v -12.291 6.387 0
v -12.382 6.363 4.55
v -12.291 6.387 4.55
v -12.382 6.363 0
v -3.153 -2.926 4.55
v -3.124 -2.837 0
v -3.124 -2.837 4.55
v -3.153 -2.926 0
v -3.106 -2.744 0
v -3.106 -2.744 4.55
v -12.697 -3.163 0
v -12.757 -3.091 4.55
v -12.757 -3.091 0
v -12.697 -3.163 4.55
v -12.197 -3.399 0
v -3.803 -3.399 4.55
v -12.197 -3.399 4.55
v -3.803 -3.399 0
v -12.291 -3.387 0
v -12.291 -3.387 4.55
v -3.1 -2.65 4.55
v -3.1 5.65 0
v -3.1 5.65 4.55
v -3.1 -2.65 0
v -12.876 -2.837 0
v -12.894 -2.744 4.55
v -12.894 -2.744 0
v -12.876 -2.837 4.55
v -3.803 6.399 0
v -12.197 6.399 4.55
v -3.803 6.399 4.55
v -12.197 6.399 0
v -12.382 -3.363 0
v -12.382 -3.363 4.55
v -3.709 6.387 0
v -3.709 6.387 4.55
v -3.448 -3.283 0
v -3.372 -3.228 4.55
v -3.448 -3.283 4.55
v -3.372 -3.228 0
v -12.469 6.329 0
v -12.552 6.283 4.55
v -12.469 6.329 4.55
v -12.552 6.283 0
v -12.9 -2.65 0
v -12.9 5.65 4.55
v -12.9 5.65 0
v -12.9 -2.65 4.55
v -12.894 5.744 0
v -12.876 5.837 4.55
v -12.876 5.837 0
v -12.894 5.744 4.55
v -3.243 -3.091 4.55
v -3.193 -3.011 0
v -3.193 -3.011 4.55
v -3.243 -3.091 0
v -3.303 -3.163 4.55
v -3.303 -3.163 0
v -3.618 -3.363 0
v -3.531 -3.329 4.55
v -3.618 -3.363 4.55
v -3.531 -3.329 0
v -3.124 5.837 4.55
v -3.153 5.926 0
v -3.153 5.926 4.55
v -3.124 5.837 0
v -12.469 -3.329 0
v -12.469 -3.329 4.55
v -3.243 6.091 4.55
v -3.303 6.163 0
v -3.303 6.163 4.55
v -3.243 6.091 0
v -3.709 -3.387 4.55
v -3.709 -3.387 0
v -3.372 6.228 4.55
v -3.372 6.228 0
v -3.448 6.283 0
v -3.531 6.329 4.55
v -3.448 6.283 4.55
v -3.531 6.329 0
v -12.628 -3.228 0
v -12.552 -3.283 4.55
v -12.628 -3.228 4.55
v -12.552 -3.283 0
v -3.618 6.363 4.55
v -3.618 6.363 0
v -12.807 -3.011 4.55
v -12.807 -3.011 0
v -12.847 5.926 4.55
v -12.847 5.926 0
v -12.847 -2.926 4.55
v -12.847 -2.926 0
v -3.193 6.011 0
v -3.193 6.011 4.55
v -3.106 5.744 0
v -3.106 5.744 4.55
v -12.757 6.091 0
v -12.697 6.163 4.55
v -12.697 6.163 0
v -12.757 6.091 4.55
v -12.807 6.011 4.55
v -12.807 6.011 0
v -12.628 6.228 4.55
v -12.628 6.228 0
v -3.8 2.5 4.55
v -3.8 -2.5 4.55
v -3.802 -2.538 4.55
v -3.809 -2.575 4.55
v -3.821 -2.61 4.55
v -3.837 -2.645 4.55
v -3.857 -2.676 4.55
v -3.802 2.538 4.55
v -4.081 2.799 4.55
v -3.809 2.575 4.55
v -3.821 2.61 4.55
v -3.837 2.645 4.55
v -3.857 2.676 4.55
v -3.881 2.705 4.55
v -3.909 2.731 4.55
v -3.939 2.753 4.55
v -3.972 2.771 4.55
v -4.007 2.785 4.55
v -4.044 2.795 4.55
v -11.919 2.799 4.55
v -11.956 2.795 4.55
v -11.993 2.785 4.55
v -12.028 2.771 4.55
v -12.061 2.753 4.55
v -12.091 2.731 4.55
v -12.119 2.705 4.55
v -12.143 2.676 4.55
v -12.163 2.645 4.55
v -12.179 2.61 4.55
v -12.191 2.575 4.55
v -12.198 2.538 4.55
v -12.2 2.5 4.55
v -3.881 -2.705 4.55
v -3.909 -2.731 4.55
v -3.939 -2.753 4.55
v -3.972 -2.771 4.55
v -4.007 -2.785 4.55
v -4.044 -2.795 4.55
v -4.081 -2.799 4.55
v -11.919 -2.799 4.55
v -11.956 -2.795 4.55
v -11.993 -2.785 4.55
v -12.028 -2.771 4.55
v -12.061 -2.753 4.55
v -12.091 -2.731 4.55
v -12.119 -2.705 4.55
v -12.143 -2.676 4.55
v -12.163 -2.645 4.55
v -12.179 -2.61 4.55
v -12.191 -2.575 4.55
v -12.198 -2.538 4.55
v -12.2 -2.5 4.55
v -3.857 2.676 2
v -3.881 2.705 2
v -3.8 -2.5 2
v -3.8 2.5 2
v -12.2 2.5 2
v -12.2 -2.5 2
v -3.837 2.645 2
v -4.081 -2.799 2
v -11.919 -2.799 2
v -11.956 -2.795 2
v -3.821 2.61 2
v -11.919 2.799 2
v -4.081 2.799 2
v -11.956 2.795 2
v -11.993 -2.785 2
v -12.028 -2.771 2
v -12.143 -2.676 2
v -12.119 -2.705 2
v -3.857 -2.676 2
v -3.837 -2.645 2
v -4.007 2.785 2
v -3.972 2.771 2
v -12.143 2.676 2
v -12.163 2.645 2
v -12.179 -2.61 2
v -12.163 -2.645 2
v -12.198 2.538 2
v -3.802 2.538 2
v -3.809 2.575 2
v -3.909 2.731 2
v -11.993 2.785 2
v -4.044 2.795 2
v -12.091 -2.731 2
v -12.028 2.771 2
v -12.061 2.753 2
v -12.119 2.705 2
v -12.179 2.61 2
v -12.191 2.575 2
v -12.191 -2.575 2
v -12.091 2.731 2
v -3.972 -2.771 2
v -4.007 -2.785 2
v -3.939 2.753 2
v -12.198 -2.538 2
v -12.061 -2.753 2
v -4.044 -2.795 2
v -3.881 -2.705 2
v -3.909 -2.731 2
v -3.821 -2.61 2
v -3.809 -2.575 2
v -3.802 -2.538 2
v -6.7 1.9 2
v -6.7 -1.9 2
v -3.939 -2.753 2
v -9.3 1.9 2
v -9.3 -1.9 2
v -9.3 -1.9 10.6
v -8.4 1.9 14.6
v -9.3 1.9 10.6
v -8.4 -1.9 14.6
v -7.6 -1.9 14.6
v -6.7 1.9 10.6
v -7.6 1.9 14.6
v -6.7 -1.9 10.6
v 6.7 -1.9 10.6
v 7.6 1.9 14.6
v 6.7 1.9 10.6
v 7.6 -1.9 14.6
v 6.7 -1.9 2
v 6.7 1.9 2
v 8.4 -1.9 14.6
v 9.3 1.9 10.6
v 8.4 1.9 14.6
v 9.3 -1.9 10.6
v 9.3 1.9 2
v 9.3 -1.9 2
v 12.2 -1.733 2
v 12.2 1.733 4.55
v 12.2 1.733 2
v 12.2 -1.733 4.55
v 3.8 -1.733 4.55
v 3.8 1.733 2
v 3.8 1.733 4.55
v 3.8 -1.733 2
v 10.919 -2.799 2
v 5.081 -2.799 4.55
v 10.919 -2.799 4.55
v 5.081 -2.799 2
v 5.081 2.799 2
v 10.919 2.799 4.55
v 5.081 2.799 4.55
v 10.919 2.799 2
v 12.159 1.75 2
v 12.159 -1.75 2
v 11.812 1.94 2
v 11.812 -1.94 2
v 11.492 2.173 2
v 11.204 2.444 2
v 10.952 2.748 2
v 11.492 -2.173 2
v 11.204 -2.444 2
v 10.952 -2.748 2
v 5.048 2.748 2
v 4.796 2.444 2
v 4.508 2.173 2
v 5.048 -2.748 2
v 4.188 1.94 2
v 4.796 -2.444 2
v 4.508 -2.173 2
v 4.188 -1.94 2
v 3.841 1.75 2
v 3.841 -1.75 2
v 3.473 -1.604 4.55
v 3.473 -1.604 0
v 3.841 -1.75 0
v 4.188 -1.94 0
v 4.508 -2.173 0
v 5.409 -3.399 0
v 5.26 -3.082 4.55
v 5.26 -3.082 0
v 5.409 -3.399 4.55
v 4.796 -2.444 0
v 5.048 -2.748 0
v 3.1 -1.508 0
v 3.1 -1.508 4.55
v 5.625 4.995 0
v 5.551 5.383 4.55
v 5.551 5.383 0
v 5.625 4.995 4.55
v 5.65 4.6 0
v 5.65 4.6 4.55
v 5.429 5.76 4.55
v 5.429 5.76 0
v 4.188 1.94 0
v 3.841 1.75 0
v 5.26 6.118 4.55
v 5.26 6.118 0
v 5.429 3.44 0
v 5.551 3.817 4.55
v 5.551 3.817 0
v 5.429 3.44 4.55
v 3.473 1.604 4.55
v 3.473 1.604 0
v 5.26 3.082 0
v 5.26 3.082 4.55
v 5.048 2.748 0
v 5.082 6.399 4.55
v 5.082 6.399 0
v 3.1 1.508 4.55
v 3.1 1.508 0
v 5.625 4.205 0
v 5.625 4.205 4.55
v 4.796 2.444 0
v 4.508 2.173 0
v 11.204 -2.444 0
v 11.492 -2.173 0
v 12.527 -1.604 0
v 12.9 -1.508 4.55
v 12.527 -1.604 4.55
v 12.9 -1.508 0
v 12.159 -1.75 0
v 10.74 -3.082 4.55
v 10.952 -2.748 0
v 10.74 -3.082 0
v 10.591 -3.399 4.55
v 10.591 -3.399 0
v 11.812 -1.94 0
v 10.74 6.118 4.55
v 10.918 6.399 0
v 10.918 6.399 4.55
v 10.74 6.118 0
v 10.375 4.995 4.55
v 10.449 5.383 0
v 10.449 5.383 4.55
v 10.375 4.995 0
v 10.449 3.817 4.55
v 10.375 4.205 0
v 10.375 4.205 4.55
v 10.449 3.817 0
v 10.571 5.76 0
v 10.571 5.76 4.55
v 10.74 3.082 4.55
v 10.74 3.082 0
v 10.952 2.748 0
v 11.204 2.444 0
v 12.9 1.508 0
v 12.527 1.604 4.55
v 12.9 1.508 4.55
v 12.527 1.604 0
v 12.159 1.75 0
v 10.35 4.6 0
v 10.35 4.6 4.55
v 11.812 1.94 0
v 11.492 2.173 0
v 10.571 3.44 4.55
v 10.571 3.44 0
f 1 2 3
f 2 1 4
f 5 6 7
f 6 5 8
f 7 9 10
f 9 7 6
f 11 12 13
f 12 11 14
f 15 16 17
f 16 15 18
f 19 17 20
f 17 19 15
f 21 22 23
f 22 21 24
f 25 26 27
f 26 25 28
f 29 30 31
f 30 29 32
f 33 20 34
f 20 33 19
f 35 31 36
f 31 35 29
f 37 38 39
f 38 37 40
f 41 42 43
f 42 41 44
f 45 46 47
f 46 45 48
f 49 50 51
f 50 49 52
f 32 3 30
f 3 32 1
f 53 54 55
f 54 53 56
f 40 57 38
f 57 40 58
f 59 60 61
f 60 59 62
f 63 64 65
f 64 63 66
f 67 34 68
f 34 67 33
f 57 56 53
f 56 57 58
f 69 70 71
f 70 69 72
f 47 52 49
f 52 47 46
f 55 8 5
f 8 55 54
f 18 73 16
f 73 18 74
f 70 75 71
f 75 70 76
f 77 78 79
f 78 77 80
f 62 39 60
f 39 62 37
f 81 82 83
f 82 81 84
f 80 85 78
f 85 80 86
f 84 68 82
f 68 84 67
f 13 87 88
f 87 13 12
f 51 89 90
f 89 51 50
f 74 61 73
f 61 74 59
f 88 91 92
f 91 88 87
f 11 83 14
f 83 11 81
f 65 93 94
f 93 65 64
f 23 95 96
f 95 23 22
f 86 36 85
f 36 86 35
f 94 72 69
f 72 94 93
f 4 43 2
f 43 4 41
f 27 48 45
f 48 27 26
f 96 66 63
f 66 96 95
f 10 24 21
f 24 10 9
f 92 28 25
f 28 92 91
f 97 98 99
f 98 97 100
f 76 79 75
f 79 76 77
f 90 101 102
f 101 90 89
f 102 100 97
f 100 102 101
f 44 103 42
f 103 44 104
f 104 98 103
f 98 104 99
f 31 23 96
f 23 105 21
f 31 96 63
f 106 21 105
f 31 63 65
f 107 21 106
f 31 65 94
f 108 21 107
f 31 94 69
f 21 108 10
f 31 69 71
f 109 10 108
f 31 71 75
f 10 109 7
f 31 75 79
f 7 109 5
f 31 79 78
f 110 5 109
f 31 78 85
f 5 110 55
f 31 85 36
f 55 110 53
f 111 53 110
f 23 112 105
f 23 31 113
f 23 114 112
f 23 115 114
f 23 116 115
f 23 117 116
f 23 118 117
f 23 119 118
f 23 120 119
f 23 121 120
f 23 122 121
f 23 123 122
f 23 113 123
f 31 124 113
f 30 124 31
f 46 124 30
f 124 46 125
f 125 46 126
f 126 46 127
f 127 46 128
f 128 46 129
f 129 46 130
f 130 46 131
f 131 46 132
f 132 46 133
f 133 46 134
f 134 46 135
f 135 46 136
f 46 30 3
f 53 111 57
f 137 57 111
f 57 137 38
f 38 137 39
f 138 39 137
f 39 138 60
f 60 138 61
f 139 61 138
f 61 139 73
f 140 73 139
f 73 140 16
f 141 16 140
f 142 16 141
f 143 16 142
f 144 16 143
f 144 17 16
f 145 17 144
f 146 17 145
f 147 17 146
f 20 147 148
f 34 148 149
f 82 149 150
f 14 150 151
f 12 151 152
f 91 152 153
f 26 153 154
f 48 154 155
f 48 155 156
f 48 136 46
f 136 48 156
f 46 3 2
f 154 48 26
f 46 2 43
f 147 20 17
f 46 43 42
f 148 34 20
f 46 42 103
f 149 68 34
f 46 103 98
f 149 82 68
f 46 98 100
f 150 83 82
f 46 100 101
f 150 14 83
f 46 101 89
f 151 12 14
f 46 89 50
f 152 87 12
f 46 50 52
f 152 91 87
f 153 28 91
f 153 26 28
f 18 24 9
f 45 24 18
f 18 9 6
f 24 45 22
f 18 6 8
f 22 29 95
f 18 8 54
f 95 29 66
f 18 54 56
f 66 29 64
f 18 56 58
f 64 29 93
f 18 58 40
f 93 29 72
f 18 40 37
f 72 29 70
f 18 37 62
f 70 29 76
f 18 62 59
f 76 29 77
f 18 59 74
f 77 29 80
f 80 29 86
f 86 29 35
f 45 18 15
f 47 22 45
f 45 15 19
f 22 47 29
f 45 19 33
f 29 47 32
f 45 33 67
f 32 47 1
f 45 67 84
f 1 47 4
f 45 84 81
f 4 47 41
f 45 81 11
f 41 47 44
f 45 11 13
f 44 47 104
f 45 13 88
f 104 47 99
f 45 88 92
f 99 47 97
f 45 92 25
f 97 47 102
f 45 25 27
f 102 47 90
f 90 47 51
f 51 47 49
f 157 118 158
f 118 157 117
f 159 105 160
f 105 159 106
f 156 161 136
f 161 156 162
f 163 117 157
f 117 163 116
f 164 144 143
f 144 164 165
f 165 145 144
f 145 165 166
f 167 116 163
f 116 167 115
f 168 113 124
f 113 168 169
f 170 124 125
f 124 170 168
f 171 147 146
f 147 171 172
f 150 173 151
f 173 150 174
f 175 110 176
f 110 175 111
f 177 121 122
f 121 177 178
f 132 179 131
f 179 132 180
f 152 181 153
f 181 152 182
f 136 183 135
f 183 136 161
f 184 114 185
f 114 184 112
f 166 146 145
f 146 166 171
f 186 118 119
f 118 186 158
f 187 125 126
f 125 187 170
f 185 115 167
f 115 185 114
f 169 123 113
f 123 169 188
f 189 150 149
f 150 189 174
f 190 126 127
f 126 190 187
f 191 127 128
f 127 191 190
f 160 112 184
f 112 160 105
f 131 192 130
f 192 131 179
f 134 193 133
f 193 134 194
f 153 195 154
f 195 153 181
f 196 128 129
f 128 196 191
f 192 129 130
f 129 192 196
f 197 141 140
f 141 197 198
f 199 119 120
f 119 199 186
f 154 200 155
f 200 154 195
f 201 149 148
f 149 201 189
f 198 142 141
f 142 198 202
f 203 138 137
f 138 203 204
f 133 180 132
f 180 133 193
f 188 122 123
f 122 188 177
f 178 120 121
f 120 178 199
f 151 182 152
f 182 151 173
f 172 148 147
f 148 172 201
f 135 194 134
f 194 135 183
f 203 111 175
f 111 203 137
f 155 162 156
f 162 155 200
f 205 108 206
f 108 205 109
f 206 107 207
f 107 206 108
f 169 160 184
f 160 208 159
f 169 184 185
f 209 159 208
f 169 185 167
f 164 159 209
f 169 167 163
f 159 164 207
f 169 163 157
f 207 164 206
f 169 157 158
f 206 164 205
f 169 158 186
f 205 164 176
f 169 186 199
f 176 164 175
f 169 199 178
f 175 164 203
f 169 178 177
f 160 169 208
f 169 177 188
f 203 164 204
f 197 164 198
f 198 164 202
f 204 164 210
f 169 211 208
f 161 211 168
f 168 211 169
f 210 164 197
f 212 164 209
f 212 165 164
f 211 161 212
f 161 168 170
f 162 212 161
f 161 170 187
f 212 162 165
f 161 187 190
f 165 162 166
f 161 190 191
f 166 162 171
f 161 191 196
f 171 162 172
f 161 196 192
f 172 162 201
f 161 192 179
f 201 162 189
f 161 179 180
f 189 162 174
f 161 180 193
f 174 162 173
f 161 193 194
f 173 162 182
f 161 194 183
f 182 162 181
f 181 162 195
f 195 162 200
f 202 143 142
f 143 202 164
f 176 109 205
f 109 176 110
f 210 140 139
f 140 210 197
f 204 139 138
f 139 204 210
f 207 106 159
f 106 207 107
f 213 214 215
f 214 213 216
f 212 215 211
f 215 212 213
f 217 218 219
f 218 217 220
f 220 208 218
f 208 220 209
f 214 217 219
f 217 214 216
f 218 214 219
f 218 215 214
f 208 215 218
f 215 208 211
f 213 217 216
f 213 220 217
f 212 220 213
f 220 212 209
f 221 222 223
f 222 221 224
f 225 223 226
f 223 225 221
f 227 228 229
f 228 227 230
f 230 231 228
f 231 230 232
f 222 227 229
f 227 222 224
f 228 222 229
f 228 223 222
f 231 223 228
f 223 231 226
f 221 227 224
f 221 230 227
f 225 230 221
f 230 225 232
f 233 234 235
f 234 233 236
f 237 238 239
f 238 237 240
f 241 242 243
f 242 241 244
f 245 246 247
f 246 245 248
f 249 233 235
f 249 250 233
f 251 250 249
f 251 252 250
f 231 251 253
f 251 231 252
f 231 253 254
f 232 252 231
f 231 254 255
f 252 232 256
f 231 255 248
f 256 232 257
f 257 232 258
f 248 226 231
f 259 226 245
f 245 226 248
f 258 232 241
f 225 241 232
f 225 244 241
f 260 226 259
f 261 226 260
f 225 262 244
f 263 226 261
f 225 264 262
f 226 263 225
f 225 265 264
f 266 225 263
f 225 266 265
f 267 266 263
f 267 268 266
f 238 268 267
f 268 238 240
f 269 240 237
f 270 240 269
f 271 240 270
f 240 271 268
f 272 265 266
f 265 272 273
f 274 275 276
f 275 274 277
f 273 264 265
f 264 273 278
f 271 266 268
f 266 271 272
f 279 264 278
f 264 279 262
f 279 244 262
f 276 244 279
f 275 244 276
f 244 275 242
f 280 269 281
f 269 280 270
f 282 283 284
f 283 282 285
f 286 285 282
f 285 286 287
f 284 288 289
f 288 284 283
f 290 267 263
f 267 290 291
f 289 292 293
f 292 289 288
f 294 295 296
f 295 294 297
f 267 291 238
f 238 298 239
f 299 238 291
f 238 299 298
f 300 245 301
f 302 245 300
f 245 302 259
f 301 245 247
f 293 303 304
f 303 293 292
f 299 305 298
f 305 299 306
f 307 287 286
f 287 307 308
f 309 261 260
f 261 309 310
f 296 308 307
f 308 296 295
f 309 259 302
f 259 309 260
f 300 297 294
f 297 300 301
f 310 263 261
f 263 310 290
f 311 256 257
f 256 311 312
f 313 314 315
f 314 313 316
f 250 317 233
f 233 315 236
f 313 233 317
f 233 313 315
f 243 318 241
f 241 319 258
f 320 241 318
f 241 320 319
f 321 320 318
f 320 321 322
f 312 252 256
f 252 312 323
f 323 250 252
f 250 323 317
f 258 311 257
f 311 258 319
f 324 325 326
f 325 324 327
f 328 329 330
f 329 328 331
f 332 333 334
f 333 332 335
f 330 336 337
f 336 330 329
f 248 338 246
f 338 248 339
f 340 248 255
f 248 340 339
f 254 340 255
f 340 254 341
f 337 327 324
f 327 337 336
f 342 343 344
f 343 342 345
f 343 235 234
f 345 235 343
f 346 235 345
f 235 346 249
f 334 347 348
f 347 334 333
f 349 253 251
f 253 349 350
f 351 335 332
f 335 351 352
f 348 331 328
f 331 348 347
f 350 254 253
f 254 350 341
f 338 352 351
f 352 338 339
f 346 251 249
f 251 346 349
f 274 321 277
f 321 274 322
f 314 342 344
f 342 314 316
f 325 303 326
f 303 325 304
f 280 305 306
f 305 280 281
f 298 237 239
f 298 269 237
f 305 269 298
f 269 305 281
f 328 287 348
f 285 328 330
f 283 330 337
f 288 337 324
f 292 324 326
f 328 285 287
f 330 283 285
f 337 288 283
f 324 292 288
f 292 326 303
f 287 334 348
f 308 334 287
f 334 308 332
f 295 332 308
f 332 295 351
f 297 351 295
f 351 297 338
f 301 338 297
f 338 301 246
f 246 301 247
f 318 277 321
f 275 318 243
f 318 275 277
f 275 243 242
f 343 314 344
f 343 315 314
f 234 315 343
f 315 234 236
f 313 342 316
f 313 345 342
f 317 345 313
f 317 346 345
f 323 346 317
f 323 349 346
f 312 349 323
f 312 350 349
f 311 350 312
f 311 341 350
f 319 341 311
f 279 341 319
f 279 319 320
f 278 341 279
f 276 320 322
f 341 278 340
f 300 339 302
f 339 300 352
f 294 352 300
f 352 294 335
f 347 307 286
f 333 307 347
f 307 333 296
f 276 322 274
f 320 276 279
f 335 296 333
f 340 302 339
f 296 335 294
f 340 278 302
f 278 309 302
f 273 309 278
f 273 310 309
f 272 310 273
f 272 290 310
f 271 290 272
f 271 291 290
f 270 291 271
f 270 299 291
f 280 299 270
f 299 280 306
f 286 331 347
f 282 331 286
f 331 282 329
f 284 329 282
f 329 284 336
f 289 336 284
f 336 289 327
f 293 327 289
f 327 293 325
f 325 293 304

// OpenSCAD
translate([-8,0,0]) { 
// Archived geometry from ../../../parts/oobb_organization_storage_drawer_unit_rectangle_100_ml_tamper_evident_systempak_209_container_1_column_2_row_ai_version_7_style_unit_1_wide_2_tall/front_plug_square.scad
$fn = 50;

difference() {
	union() {
		translate(v = [0, 0, 0]) {
			rotate(a = [0, 0, 0]) {
				difference() {
					union() {
						translate(v = [0, 0, 0]) {
							rotate(a = [0, 0, 0]) {
								difference() {
									union() {
										translate(v = [0, 0, 0]) {
											rotate(a = [0, 0, 0]) {
												difference() {
													union() {
														translate(v = [0, 1.5, 0]) {
															hull() {
																translate(v = [-4.15, 4.15, 0]) {
																	cylinder(h = 4.55, r = 0.75);
																}
																translate(v = [4.15, 4.15, 0]) {
																	cylinder(h = 4.55, r = 0.75);
																}
																translate(v = [-4.15, -4.15, 0]) {
																	cylinder(h = 4.55, r = 0.75);
																}
																translate(v = [4.15, -4.15, 0]) {
																	cylinder(h = 4.55, r = 0.75);
																}
															}
														}
													}
													union() {
														translate(v = [0, 0, 2.0]) {
															hull() {
																translate(v = [-3.9000000000000004, 2.5, 0]) {
																	cylinder(h = 2.65, r = 0.3);
																}
																translate(v = [3.9000000000000004, 2.5, 0]) {
																	cylinder(h = 2.65, r = 0.3);
																}
																translate(v = [-3.9000000000000004, -2.5, 0]) {
																	cylinder(h = 2.65, r = 0.3);
																}
																translate(v = [3.9000000000000004, -2.5, 0]) {
																	cylinder(h = 2.65, r = 0.3);
																}
															}
														}
													}
												}
											}
										}
										translate(v = [0, 0, 0]) {
											rotate(a = [0, 0, 0]) {
												difference() {
													union() {
														translate(v = [-1.4000000000000001, -1.9, 1.95]) {
															cube(size = [2.8000000000000003, 3.8, 12.65]);
														}
													}
													union() {
														translate(v = [0, 2.0, 0]) {
															rotate(a = [90, 0, 0]) {
																linear_extrude(height = 4.0) {
																	polygon(points = [[-1.3, 1.85], [-1.3, 10.6], [-0.4, 14.6], [-0.4, 14.799999999999999], [-1.6, 14.799999999999999], [-1.6, 1.85]]);
																}
															}
														}
														translate(v = [0, 2.0, 0]) {
															rotate(a = [90, 0, 0]) {
																linear_extrude(height = 4.0) {
																	polygon(points = [[1.3, 1.85], [1.3, 10.6], [0.4, 14.6], [0.4, 14.799999999999999], [1.6, 14.799999999999999], [1.6, 1.85]]);
																}
															}
														}
													}
												}
											}
										}
									}
									union();
								}
							}
						}
					}
					union();
				}
			}
		}
	}
	union();
}
 }
translate([8,0,0]) { 
// Archived geometry from ../../../parts/oobb_organization_storage_drawer_unit_rectangle_100_ml_tamper_evident_systempak_209_container_1_column_2_row_ai_version_7_style_unit_1_wide_2_tall/front_plug.scad
$fn = 50;

difference() {
	union() {
		translate(v = [0, 0, 0]) {
			rotate(a = [0, 0, 0]) {
				difference() {
					union() {
						translate(v = [0, 0, 0]) {
							rotate(a = [0, 0, 0]) {
								difference() {
									union() {
										translate(v = [0, 0, 0]) {
											rotate(a = [0, 0, 0]) {
												difference() {
													union() {
														translate(v = [0, 1.5, 0]) {
															hull() {
																translate(v = [-4.15, 4.15, 0]) {
																	cylinder(h = 4.55, r = 0.75);
																}
																translate(v = [4.15, 4.15, 0]) {
																	cylinder(h = 4.55, r = 0.75);
																}
																translate(v = [-4.15, -4.15, 0]) {
																	cylinder(h = 4.55, r = 0.75);
																}
																translate(v = [4.15, -4.15, 0]) {
																	cylinder(h = 4.55, r = 0.75);
																}
															}
														}
													}
													union() {
														translate(v = [0, 0, 2.0]) {
															hull() {
																translate(v = [-3.9000000000000004, 2.5, 0]) {
																	cylinder(h = 2.65, r = 0.3);
																}
																translate(v = [3.9000000000000004, 2.5, 0]) {
																	cylinder(h = 2.65, r = 0.3);
																}
																translate(v = [-3.9000000000000004, -2.5, 0]) {
																	cylinder(h = 2.65, r = 0.3);
																}
																translate(v = [3.9000000000000004, -2.5, 0]) {
																	cylinder(h = 2.65, r = 0.3);
																}
															}
														}
														translate(v = [-5.5, -4.6, -0.1]) {
															cylinder(h = 4.75, r = 3.15);
														}
														translate(v = [-5.5, 4.6, -0.1]) {
															cylinder(h = 4.75, r = 3.15);
														}
														translate(v = [5.5, -4.6, -0.1]) {
															cylinder(h = 4.75, r = 3.15);
														}
														translate(v = [5.5, 4.6, -0.1]) {
															cylinder(h = 4.75, r = 3.15);
														}
													}
												}
											}
										}
										translate(v = [0, 0, 0]) {
											rotate(a = [0, 0, 0]) {
												difference() {
													union() {
														translate(v = [-1.4000000000000001, -1.9, 1.95]) {
															cube(size = [2.8000000000000003, 3.8, 12.65]);
														}
													}
													union() {
														translate(v = [0, 2.0, 0]) {
															rotate(a = [90, 0, 0]) {
																linear_extrude(height = 4.0) {
																	polygon(points = [[-1.3, 1.85], [-1.3, 10.6], [-0.4, 14.6], [-0.4, 14.799999999999999], [-1.6, 14.799999999999999], [-1.6, 1.85]]);
																}
															}
														}
														translate(v = [0, 2.0, 0]) {
															rotate(a = [90, 0, 0]) {
																linear_extrude(height = 4.0) {
																	polygon(points = [[1.3, 1.85], [1.3, 10.6], [0.4, 14.6], [0.4, 14.799999999999999], [1.6, 14.799999999999999], [1.6, 1.85]]);
																}
															}
														}
													}
												}
											}
										}
									}
									union();
								}
							}
						}
					}
					union();
				}
			}
		}
	}
	union();
}
 }
